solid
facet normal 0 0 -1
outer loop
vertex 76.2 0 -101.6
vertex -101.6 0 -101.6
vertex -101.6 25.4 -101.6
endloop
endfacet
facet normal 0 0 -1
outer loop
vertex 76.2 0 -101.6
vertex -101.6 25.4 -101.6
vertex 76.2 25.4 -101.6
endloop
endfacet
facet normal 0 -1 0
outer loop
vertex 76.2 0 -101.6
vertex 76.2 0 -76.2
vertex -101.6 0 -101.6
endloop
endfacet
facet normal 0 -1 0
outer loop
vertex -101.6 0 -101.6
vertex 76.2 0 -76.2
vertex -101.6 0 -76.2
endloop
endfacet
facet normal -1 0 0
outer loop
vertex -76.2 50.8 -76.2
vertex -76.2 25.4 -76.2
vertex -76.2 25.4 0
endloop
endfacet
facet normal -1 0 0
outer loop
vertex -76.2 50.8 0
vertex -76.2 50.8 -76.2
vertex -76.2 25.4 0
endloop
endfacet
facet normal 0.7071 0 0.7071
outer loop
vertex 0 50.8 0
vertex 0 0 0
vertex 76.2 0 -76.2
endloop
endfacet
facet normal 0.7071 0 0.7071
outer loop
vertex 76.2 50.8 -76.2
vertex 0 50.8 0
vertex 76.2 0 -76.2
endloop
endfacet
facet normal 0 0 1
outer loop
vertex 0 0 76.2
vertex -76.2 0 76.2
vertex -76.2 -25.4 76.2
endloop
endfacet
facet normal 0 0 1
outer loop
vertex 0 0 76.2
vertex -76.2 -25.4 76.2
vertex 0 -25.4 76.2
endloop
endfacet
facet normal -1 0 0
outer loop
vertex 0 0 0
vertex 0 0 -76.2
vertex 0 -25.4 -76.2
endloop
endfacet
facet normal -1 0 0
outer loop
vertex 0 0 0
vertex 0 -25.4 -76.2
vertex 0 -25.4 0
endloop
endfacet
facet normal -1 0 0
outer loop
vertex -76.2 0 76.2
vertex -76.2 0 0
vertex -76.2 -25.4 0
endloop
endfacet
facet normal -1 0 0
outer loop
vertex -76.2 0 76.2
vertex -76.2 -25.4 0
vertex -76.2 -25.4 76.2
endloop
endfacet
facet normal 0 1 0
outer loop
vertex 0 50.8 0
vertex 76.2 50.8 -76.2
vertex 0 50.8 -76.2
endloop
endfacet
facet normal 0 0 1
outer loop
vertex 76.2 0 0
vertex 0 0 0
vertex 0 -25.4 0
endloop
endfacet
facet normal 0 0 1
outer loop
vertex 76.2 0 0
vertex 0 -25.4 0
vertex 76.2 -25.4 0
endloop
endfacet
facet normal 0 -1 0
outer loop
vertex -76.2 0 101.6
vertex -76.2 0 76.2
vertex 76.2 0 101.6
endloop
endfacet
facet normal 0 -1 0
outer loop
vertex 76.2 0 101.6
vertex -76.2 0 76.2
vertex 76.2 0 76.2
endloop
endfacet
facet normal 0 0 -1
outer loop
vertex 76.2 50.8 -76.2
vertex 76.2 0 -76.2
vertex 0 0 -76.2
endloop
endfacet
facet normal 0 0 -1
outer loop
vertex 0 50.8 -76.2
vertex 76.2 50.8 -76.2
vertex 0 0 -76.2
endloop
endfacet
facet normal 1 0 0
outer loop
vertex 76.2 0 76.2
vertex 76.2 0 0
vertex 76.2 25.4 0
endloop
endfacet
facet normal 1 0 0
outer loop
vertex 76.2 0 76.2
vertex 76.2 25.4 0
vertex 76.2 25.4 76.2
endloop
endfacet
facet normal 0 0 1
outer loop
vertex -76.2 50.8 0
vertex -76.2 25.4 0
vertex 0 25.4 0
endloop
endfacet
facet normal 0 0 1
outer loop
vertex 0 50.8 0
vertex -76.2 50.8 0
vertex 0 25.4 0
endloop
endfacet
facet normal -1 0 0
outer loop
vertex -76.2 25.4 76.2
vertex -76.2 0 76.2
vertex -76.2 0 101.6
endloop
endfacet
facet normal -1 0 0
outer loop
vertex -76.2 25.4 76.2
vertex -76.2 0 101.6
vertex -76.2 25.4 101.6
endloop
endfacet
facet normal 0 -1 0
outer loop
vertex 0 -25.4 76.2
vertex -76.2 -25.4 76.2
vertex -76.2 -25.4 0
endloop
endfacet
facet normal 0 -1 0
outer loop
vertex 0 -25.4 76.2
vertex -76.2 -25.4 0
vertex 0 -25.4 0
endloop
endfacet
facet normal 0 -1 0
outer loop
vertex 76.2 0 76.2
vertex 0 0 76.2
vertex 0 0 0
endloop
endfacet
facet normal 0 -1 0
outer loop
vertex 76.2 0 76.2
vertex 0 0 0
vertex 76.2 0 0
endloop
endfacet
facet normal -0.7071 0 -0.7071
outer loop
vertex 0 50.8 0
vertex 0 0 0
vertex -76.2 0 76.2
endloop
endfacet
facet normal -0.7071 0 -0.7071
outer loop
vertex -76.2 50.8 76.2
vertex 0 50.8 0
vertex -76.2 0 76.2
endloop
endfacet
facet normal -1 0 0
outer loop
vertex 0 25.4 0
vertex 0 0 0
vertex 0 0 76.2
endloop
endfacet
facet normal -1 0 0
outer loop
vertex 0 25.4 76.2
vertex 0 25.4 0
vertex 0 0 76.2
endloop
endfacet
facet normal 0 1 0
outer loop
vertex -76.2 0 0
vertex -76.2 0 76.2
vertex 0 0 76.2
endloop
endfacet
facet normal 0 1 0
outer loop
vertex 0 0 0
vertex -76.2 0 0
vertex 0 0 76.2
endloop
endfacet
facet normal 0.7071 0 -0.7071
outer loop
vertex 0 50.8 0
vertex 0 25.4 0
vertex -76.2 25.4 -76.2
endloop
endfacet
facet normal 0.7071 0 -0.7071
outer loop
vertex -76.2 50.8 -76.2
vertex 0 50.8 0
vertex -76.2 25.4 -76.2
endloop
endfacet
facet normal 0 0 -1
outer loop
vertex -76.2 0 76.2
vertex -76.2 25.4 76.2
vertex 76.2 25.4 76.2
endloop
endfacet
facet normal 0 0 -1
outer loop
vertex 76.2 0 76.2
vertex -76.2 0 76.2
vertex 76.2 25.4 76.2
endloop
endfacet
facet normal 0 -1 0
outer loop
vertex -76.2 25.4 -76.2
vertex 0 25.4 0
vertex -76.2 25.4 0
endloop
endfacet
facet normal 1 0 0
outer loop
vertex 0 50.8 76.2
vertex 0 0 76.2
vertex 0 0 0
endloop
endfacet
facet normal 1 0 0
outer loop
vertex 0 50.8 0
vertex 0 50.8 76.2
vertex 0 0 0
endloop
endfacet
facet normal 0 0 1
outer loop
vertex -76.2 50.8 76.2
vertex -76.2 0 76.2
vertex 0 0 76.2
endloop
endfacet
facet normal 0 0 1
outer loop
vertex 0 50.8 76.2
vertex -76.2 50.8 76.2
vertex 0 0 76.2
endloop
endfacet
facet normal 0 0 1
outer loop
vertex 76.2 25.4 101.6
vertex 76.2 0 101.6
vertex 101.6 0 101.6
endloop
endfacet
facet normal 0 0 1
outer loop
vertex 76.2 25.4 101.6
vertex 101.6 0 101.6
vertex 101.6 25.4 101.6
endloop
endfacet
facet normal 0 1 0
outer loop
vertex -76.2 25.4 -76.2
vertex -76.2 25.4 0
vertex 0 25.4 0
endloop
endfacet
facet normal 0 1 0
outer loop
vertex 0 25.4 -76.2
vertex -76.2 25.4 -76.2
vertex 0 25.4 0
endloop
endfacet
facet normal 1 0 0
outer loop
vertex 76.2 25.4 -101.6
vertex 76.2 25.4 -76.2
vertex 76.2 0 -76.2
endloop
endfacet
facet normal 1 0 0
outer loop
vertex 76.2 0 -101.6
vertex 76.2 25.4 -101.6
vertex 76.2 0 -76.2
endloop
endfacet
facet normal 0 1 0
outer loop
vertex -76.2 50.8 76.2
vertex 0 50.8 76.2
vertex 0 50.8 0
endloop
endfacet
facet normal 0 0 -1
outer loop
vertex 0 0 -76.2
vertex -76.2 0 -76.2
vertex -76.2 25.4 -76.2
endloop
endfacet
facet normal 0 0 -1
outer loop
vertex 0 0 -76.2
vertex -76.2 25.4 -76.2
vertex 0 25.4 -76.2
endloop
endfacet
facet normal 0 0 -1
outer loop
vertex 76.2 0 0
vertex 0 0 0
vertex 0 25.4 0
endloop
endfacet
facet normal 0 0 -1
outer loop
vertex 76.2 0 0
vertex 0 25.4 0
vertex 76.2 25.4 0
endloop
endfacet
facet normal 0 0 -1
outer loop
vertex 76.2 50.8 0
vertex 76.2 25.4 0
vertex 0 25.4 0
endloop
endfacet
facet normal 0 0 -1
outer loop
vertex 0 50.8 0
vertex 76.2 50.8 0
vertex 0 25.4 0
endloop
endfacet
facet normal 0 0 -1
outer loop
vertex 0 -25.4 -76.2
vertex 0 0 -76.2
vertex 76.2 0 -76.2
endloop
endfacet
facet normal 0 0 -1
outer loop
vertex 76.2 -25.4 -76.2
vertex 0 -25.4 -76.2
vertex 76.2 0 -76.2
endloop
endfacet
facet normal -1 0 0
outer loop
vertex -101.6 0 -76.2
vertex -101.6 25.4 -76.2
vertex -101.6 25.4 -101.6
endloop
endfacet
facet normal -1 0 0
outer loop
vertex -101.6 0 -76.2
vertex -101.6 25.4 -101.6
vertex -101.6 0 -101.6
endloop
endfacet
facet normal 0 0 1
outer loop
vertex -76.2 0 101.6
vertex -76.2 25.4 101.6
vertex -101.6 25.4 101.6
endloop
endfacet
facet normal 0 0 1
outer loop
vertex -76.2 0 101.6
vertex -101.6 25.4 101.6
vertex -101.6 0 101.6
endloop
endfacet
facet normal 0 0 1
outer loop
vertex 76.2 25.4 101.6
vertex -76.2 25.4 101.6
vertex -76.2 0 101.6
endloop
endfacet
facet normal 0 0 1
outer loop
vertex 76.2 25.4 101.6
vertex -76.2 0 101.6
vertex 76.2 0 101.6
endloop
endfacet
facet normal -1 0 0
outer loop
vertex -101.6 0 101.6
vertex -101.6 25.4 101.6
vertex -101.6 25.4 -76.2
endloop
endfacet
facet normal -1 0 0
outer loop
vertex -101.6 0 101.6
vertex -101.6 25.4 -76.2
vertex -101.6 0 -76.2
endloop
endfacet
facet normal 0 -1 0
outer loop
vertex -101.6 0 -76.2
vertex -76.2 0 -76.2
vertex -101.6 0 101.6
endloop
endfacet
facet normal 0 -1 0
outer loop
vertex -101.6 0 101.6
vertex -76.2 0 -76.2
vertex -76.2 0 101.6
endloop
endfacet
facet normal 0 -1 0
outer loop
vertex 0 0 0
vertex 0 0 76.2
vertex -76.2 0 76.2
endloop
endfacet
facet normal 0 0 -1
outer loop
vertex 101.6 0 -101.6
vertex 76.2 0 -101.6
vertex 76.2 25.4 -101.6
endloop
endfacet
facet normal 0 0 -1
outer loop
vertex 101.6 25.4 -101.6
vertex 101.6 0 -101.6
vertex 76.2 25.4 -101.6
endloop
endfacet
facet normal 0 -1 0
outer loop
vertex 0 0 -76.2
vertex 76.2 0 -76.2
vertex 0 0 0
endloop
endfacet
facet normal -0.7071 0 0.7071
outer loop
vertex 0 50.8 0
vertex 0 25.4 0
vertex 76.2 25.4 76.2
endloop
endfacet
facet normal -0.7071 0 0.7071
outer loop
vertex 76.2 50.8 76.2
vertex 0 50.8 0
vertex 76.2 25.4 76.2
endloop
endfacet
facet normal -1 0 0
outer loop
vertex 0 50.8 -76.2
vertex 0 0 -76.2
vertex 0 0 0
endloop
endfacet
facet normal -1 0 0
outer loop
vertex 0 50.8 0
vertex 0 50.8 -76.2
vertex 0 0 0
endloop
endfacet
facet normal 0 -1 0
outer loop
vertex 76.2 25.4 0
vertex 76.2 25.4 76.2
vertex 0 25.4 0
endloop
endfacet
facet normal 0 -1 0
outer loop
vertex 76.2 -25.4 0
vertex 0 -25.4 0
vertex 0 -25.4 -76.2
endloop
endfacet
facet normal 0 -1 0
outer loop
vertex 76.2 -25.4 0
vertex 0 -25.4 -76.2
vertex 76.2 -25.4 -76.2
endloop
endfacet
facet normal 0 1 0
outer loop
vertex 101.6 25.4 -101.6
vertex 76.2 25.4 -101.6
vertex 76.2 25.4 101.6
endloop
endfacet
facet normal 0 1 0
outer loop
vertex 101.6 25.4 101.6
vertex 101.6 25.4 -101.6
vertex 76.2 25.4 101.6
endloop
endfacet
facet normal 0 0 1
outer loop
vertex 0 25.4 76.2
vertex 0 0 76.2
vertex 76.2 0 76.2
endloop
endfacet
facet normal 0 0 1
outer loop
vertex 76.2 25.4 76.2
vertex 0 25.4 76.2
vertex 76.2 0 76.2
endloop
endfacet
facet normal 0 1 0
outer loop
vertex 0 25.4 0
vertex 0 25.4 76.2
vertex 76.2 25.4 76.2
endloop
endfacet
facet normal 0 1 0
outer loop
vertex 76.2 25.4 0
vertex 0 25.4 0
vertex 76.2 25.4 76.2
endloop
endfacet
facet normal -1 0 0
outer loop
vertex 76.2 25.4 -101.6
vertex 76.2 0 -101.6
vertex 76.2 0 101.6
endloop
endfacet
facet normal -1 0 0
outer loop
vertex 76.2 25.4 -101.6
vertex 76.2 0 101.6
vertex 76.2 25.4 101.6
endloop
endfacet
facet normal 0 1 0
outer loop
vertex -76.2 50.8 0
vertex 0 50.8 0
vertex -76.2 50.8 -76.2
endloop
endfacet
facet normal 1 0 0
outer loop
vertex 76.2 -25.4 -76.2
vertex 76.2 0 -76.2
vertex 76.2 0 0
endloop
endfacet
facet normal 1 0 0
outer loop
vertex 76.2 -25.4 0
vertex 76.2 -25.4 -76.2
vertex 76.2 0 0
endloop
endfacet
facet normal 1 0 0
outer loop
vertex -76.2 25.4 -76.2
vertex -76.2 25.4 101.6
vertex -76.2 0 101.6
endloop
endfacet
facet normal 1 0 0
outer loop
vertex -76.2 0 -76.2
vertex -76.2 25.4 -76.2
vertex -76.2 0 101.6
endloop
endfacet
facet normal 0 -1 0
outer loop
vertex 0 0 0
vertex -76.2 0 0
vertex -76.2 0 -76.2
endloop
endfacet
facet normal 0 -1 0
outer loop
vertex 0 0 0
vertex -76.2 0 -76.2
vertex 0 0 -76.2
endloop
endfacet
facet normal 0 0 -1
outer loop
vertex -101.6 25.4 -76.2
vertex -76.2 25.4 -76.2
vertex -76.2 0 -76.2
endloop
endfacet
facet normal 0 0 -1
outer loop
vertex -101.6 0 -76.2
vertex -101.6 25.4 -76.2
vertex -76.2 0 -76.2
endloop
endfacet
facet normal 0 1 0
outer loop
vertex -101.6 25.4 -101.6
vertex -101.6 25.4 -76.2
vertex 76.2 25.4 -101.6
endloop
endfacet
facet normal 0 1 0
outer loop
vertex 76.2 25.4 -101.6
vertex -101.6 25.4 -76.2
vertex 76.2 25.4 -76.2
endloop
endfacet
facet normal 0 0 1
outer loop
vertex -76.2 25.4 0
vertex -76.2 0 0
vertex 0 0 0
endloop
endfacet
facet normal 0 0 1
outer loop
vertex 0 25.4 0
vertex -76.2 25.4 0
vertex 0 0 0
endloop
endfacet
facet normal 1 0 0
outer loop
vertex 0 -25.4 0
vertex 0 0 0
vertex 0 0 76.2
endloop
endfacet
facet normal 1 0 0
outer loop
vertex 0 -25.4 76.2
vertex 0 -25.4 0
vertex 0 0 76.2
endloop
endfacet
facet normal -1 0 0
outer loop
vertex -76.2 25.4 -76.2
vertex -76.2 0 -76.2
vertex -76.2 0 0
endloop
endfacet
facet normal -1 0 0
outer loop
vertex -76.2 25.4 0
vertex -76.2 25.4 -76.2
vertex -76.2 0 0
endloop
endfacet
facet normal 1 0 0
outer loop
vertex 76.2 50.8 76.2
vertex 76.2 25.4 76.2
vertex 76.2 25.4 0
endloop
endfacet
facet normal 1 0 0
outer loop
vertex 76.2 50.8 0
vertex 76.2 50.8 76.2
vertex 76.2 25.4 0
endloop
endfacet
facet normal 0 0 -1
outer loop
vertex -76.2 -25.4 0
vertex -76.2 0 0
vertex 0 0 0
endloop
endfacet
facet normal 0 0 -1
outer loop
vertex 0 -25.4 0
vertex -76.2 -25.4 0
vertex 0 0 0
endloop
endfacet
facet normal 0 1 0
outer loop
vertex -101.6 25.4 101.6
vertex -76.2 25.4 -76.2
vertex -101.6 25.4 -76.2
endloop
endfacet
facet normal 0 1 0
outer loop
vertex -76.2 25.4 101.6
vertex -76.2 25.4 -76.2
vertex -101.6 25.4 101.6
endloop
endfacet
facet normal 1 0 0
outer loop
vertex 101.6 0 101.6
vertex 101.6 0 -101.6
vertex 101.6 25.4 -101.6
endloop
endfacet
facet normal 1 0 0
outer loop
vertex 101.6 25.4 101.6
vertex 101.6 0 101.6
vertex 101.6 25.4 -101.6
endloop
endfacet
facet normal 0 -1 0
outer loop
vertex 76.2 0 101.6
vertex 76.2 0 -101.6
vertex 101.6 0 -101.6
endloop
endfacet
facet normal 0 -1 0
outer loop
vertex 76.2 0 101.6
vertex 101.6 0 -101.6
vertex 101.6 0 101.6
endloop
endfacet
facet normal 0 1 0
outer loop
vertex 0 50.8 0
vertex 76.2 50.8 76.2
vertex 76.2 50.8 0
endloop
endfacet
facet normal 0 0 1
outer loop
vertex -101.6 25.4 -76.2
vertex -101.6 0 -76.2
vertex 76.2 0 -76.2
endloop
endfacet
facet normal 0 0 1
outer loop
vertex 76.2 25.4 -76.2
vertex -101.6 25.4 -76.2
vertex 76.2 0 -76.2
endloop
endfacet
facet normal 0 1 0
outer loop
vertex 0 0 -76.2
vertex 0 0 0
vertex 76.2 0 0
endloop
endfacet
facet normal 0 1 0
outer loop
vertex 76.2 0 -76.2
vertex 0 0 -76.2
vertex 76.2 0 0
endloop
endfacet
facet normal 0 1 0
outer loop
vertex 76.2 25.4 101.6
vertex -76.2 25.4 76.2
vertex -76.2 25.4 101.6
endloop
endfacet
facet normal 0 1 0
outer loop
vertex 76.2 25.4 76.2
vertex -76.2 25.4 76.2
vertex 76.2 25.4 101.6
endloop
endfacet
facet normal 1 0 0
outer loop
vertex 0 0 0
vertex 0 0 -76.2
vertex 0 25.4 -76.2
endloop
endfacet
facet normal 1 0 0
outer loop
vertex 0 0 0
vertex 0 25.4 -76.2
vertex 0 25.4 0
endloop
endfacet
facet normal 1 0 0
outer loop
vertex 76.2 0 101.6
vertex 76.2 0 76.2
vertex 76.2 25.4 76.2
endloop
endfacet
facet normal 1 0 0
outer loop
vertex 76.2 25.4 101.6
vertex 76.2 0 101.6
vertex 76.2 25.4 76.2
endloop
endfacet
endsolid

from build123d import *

# Parameters (mm, degrees)
F0_W      = 76.2
F0_H      = 76.2
F1_DEPTH  = 25.4
F2_DEPTH  = 25.4
F3_DEPTH  = 25.4
F4_DEPTH  = 25.4
F5_W      = 152.4
F5_H      = 25.4
F6_DEPTH  = 25.4
F7_W      = 25.4
F7_H      = 177.8
F8_DEPTH  = 25.4
F9_W      = 152.4
F9_H      = 25.4
F9_W_2    = 25.4
F10_DEPTH = 25.4
F11_W     = 25.4
F11_H     = 203.2
F12_DEPTH = 25.4
F14_DEPTH = 50.8
F16_DEPTH = 50.8
F18_DEPTH = 25.4
F20_DEPTH = 25.4


with BuildPart() as f1:
    # F0 (on Front) → F1 (new body)
    with BuildSketch(Plane.XZ):
        with Locations((-38.1, 38.1)):
            Rectangle(F0_W, F0_H)
    extrude(amount=F1_DEPTH)

    # F0 (on Front) → F2 (join)
    with BuildSketch(Plane.XZ):
        with Locations((38.1, 38.1)):
            Rectangle(F0_W, F0_H)
    extrude(amount=-F2_DEPTH)


with BuildPart() as f3:
    # F0 (on Front) → F3 (new body)
    with BuildSketch(Plane.XZ):
        with Locations((38.1, -38.1)):
            Rectangle(F0_W, F0_H)
    extrude(amount=F3_DEPTH)


with BuildPart() as f4:
    # F0 (on Front) → F4 (new body)
    with BuildSketch(Plane.XZ):
        with Locations((-38.1, -38.1)):
            Rectangle(F0_W, F0_H)
    extrude(amount=-F4_DEPTH)


with BuildPart() as f6:
    # F5 (on face) → F6 (new body)
    with BuildSketch(Plane.XY.offset(76.2)):
        with Locations((0, 12.7)):
            Rectangle(F5_W, F5_H)
    extrude(amount=F6_DEPTH)


with BuildPart() as f8:
    # F7 (on face) → F8 (new body)
    with BuildSketch(Plane(origin=(-76.2, 0, 0), x_dir=(0, -1, 0), z_dir=(-1, 0, 0))):
        with Locations((-12.7, 12.7)):
            Rectangle(F7_W, F7_H)
    extrude(amount=F8_DEPTH)


with BuildPart() as f10:
    # F9 (on face) → F10 (new body)
    with BuildSketch(Plane(origin=(0, 0, -76.2), x_dir=(1, 0, 0), z_dir=(0, 0, -1))):
        with Locations((0, -12.7)):
            Rectangle(F9_W, F9_H)
        with Locations((-88.9, -12.7)):
            Rectangle(F9_W_2, F9_H)
    extrude(amount=F10_DEPTH)


with BuildPart() as f12:
    # F11 (on face) → F12 (new body)
    with BuildSketch(Plane.YZ.offset(76.2)):
        with Locations((12.7, 0)):
            Rectangle(F11_W, F11_H)
    extrude(amount=F12_DEPTH)


with BuildPart() as f14:
    # F13 (on face) → F14 (new body)
    with BuildSketch(Plane(origin=(0, 0, 0), x_dir=(-1, 0, 0), z_dir=(0, 1, 0))):
        Polygon((0, 0), (-76.2, -76.2), (0, -76.2), align=None)
    extrude(amount=F14_DEPTH)


with BuildPart() as f16:
    # F15 (on face) → F16 (new body)
    with BuildSketch(Plane(origin=(0, 0, 0), x_dir=(-1, 0, 0), z_dir=(0, 1, 0))):
        Polygon((0, 0), (76.2, 76.2), (0, 76.2), align=None)
    extrude(amount=F16_DEPTH)


with BuildPart() as f18:
    # F17 (on face) → F18 (new body)
    with BuildSketch(Plane(origin=(0, 25.4, 0), x_dir=(-1, 0, 0), z_dir=(0, 1, 0))):
        Polygon((-76.2, 0), (0, 0), (-76.2, 76.2), align=None)
    extrude(amount=F18_DEPTH)


with BuildPart() as f20:
    # F19 (on face) → F20 (new body)
    with BuildSketch(Plane(origin=(0, 25.4, 0), x_dir=(-1, 0, 0), z_dir=(0, 1, 0))):
        Polygon((76.2, 0), (0, 0), (76.2, -76.2), align=None)
    extrude(amount=F20_DEPTH)


solid = Compound([f1.part, f3.part, f4.part, f6.part, f8.part, f10.part, f12.part, f14.part, f16.part, f18.part, f20.part])
